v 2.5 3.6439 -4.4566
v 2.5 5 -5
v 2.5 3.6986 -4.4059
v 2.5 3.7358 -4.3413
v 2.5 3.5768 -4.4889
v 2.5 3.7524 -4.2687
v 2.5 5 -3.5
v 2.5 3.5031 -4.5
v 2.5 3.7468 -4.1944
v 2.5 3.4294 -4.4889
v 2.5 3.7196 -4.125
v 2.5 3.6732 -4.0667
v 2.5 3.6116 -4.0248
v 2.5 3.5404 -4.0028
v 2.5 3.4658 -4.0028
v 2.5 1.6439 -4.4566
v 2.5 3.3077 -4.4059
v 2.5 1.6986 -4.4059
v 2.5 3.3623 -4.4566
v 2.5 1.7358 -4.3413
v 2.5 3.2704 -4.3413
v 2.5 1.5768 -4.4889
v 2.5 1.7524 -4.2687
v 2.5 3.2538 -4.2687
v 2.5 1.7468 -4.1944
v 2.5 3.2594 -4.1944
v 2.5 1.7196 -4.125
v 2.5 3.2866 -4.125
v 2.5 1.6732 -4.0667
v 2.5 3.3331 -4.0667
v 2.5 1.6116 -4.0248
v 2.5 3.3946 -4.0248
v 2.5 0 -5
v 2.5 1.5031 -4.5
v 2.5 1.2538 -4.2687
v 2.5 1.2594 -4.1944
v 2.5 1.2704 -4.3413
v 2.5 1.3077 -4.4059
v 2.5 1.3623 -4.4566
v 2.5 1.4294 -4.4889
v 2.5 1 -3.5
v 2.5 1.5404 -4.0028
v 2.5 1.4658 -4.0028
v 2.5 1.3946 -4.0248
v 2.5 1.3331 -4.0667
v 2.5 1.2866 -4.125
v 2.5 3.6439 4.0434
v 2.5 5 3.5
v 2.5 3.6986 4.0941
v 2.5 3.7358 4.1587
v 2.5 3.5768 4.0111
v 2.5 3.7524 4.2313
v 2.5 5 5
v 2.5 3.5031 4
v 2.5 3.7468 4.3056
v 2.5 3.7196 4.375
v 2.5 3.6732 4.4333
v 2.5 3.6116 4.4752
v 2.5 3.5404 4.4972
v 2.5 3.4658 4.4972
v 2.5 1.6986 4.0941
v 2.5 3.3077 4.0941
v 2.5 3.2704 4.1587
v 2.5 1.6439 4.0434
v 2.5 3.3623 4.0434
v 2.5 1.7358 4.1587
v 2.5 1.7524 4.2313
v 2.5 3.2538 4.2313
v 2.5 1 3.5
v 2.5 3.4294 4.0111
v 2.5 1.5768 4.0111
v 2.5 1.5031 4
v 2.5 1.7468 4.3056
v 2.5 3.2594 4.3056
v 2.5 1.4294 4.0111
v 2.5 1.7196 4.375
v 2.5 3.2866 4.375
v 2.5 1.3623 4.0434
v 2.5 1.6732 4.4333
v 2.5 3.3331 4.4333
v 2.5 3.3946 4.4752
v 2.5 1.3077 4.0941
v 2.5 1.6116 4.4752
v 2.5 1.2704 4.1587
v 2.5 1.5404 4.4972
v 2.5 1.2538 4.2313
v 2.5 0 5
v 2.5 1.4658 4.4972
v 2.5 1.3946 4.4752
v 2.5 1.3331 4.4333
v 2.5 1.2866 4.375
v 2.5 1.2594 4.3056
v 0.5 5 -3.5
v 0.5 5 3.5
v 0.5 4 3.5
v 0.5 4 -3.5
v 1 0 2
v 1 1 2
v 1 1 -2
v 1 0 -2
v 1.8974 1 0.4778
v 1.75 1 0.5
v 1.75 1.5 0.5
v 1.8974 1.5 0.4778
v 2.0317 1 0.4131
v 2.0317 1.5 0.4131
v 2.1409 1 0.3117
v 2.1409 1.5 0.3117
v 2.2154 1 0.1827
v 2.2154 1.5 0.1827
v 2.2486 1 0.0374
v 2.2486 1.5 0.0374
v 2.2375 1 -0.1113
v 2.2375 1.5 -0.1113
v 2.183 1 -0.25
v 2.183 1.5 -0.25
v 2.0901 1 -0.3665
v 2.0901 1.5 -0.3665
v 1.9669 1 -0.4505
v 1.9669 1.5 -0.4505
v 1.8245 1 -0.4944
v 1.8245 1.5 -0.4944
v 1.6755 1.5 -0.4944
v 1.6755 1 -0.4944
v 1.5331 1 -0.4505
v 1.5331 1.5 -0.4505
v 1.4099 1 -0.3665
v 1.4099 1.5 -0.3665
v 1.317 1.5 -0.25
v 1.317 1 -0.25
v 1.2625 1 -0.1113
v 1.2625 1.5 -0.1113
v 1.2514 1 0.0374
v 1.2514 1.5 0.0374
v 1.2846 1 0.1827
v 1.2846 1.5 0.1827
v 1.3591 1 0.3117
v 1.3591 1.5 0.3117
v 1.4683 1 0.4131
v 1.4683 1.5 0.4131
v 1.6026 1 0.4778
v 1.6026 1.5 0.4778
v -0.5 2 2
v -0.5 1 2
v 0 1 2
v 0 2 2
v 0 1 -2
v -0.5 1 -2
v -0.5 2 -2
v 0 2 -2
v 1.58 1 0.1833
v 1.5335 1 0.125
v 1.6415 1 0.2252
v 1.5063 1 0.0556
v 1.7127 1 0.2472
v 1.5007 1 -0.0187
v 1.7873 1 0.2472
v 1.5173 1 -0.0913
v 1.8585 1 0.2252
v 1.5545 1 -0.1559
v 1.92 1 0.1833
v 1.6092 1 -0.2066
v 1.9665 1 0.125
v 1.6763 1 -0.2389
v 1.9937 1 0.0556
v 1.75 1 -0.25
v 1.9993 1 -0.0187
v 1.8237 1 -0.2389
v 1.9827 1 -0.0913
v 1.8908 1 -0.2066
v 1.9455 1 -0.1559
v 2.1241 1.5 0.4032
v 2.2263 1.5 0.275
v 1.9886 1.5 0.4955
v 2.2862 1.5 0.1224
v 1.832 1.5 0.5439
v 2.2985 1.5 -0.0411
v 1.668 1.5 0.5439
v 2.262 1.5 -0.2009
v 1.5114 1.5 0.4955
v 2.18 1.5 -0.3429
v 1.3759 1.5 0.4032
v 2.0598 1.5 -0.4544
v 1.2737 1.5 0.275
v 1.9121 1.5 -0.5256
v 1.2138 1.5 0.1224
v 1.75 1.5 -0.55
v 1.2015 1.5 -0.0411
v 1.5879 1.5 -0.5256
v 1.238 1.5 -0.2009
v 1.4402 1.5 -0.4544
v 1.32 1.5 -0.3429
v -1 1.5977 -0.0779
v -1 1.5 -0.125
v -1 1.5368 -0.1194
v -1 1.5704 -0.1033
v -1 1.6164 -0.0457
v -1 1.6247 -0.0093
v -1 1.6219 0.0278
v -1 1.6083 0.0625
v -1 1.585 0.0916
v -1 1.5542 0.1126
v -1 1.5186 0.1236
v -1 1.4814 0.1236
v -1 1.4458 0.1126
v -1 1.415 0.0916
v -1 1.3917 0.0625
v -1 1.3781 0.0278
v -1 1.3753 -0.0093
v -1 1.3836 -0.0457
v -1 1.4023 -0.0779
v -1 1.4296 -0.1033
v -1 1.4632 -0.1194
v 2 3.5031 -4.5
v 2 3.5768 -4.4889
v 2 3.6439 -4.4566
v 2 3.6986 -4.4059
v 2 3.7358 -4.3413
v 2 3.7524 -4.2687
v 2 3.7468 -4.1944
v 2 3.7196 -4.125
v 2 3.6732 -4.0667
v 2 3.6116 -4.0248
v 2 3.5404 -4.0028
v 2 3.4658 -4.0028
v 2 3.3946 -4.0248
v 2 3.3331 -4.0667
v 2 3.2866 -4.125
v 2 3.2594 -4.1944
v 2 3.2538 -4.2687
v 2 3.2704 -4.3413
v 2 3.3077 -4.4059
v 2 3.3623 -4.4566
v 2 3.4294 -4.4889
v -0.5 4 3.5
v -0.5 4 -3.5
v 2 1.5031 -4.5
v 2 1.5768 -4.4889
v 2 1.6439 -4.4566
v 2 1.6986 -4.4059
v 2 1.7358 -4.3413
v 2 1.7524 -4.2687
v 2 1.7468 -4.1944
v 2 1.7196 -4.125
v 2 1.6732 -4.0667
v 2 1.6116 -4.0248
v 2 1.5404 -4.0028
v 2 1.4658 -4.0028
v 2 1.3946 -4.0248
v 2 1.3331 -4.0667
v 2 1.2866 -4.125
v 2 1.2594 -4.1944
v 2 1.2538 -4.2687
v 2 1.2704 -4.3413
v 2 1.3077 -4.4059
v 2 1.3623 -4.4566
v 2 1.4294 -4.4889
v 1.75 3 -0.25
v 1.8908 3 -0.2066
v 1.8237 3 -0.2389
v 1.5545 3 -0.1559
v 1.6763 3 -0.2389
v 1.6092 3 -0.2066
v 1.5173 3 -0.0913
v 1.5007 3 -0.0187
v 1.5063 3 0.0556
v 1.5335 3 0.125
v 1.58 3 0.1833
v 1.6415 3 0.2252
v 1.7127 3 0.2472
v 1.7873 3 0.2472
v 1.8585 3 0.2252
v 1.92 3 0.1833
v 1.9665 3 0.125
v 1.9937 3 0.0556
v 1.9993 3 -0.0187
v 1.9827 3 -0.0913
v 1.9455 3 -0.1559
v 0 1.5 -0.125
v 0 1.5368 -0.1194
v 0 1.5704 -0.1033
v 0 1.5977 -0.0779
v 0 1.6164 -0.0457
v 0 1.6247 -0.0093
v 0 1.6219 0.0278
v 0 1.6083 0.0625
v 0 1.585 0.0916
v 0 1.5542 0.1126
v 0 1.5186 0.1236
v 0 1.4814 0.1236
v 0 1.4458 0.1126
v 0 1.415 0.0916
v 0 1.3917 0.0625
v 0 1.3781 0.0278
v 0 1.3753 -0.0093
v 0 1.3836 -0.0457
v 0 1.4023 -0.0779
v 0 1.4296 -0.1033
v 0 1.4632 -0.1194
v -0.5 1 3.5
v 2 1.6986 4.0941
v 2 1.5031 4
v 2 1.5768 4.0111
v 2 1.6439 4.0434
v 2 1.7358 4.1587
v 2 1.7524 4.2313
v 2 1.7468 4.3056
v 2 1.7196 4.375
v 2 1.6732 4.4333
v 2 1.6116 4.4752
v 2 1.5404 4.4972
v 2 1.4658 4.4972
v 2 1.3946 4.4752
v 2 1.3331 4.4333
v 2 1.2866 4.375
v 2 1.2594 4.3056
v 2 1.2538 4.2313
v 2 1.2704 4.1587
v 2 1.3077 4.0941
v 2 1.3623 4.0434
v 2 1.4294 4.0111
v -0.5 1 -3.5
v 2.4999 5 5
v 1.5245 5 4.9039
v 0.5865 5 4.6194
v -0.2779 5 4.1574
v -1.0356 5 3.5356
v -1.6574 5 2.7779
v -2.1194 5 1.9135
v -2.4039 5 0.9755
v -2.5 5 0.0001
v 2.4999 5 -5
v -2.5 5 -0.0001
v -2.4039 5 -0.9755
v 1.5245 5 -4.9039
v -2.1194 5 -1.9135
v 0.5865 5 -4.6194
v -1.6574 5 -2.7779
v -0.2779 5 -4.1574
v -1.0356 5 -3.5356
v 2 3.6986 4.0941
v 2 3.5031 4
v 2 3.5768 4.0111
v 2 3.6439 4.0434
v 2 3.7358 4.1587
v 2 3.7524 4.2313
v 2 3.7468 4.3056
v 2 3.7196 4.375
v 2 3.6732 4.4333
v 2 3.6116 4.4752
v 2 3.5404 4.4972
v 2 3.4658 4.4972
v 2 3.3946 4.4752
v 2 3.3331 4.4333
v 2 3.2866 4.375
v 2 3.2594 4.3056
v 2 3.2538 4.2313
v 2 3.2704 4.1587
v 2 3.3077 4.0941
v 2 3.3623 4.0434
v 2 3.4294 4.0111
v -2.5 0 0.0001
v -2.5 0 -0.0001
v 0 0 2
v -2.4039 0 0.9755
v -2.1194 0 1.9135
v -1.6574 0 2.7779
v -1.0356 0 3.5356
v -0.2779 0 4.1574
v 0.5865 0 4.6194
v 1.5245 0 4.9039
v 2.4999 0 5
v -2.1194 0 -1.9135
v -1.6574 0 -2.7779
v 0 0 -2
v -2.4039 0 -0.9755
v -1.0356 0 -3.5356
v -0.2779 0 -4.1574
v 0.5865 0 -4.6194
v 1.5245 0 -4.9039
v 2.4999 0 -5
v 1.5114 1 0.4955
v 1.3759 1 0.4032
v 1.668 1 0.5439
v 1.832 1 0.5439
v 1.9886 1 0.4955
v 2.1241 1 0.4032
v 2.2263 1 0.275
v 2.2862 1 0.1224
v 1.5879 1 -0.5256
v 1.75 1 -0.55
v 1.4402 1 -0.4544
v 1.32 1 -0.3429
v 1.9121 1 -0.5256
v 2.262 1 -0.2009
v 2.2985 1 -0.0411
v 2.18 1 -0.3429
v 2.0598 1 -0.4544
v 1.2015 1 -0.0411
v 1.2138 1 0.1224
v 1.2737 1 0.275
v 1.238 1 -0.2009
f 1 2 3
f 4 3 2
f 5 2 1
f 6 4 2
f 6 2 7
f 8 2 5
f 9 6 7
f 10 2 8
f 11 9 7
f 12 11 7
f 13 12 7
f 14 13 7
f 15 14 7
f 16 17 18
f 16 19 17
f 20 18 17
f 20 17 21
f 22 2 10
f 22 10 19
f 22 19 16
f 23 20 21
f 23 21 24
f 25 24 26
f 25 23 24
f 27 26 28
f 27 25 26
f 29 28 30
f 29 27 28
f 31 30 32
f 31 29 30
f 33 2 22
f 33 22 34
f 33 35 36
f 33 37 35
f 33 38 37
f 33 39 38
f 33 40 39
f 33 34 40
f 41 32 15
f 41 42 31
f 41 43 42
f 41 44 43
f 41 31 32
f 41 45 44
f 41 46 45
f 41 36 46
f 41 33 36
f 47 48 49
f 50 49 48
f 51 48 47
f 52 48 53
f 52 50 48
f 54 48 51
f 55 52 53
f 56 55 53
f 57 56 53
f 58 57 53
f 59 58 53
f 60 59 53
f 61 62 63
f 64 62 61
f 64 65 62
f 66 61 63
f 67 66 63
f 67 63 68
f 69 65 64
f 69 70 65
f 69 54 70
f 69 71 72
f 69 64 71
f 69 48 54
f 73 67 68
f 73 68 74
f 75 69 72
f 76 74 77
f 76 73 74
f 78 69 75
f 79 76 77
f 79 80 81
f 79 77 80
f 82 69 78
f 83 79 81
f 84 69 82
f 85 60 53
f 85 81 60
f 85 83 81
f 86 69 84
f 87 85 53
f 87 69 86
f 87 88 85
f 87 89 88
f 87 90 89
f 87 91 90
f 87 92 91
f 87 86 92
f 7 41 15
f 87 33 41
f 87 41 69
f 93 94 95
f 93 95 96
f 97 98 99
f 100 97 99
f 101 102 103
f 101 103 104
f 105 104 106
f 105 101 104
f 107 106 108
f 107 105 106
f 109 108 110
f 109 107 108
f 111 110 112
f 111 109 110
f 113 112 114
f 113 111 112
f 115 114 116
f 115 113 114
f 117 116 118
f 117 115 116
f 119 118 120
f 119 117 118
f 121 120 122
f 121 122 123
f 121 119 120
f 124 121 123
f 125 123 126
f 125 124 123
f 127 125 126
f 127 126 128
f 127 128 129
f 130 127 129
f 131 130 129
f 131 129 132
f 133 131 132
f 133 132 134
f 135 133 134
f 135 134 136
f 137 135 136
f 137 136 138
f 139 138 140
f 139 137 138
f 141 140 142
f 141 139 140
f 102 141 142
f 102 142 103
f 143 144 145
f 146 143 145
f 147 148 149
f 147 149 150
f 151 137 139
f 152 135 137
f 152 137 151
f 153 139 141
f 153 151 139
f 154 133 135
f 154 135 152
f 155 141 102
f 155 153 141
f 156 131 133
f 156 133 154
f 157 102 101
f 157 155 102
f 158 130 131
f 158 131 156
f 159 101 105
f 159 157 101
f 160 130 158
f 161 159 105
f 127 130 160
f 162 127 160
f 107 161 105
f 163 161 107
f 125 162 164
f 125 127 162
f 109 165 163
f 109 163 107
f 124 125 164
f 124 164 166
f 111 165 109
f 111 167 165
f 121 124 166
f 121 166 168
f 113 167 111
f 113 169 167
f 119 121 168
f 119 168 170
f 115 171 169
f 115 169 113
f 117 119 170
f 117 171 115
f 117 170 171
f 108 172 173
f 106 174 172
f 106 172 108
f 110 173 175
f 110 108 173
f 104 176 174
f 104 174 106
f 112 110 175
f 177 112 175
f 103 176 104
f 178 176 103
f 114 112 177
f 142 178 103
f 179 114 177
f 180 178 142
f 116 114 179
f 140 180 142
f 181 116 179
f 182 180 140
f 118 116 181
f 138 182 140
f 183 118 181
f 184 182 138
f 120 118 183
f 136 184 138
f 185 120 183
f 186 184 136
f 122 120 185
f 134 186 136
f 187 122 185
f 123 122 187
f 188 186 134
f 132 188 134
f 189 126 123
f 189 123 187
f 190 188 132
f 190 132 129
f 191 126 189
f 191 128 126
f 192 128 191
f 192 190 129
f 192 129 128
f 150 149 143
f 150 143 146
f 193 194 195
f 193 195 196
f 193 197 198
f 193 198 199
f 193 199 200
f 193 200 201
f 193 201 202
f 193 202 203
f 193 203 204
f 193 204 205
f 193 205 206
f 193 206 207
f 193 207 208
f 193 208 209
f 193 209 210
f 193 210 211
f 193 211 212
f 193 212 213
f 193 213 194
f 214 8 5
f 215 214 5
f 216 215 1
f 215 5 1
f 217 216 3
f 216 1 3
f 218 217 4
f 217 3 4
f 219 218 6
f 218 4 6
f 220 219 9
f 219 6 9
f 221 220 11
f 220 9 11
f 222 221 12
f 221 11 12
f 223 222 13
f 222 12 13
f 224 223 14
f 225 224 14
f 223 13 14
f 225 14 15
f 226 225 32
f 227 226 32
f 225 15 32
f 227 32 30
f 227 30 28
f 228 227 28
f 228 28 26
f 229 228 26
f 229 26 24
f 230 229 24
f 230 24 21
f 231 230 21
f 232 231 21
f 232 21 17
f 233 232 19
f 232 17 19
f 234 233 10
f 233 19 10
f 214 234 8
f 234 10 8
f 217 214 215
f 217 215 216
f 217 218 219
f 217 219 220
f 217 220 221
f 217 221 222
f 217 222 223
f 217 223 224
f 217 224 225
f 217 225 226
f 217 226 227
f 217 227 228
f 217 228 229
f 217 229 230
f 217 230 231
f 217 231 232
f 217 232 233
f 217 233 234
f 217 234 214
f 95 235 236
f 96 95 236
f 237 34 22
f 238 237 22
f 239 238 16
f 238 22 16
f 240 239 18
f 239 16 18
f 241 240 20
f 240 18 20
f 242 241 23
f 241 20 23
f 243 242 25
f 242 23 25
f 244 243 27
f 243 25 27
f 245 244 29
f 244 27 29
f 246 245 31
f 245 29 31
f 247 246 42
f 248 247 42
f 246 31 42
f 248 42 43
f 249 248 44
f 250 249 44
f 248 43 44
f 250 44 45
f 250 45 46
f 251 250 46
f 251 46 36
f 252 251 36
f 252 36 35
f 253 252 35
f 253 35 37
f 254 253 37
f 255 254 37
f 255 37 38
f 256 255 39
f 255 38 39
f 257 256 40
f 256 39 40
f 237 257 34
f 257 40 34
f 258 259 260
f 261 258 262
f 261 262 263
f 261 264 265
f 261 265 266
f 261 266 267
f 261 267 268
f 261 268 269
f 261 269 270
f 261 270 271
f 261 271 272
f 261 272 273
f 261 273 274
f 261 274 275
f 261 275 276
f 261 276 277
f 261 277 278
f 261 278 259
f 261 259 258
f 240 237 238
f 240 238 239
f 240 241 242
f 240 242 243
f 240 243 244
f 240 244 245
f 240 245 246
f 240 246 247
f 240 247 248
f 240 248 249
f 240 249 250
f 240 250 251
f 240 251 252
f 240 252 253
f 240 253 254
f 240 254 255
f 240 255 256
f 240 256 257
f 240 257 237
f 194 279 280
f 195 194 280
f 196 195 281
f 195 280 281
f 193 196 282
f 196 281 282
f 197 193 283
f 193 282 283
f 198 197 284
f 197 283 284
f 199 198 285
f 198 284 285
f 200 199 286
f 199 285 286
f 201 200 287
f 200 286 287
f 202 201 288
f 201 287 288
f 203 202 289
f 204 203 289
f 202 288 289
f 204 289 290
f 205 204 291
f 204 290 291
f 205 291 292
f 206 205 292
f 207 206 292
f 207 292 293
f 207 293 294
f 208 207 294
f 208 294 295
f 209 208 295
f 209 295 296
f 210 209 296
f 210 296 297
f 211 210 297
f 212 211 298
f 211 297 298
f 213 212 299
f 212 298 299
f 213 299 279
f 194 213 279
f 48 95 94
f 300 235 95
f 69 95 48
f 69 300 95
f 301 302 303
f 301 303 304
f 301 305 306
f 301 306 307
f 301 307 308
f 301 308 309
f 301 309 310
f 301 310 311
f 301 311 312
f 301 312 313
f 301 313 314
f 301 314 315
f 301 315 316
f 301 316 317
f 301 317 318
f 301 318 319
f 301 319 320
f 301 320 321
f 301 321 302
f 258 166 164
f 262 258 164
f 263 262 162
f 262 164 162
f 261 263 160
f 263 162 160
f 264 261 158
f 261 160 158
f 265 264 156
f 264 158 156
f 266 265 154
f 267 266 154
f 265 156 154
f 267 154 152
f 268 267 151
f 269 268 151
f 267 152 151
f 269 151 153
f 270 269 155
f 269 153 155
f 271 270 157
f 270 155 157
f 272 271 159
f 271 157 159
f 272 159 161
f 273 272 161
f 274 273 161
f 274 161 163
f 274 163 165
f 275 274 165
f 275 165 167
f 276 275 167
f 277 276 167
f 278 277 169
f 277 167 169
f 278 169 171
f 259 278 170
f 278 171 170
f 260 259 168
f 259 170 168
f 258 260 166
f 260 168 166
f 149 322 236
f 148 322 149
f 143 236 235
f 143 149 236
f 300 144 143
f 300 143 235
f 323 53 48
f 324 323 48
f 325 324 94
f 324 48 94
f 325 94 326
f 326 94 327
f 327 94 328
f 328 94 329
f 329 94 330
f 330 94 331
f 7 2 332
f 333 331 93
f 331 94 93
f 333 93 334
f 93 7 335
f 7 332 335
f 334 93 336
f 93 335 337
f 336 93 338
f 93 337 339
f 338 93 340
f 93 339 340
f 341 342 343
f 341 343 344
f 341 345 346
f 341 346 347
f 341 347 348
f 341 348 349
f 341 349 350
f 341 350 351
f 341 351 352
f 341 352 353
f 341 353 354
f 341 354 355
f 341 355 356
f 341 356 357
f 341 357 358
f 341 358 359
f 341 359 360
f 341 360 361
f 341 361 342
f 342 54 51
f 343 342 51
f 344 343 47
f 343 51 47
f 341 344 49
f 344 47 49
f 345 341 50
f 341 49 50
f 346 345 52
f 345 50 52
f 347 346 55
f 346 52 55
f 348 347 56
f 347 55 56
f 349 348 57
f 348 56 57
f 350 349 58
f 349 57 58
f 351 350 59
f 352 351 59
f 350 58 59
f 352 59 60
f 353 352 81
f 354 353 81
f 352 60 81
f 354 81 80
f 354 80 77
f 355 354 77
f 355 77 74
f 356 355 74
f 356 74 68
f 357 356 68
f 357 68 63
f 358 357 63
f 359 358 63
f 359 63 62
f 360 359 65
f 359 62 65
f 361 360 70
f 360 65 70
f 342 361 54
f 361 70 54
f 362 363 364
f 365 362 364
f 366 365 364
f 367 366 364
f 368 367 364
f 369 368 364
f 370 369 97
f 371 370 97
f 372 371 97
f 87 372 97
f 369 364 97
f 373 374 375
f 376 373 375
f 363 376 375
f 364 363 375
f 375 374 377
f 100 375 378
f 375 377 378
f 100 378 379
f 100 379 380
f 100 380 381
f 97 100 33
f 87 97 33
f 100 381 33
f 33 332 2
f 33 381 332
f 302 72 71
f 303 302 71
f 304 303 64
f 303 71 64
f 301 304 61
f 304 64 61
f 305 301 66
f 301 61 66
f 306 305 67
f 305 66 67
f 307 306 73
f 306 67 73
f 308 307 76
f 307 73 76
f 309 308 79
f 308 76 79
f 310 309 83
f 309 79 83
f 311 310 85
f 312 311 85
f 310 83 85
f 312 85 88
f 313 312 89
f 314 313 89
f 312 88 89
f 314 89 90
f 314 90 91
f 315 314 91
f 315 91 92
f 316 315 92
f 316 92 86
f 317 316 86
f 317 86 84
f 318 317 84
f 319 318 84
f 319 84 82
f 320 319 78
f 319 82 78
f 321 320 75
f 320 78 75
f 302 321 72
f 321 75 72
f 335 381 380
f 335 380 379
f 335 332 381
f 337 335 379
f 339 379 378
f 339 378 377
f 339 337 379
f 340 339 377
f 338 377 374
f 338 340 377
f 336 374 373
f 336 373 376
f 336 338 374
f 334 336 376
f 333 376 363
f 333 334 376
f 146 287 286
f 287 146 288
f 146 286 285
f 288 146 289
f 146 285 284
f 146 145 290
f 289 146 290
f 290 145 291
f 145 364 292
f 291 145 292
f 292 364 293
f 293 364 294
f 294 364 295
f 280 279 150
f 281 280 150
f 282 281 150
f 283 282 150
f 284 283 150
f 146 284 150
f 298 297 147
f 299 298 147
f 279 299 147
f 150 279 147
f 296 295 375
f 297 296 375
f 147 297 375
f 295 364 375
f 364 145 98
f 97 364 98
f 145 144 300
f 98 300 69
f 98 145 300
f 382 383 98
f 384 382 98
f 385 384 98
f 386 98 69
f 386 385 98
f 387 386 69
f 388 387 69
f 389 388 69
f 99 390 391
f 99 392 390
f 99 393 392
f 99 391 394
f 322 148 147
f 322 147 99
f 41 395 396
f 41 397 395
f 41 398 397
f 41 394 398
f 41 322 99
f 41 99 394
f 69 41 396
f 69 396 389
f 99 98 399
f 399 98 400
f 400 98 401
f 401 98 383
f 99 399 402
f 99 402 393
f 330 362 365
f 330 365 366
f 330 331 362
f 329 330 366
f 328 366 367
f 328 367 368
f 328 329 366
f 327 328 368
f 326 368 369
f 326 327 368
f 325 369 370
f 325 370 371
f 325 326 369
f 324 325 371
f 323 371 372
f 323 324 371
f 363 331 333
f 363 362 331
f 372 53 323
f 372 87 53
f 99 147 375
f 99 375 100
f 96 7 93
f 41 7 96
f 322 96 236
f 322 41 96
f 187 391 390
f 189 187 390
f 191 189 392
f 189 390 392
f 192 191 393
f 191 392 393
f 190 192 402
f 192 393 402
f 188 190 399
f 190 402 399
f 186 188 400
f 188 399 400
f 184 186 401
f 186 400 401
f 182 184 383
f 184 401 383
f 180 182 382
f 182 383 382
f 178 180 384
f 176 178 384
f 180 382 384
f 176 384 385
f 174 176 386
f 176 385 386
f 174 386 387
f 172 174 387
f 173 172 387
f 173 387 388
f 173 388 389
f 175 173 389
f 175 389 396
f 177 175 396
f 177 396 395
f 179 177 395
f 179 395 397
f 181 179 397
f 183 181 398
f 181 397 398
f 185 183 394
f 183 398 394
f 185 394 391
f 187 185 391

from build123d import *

# Parameters (mm, degrees)
SZKIC1_W                    = 5
SZKIC1_H                    = 10
DODANIE_WYCI_GNI_CIE1_DEPTH = 1
DODANIE_WYCI_GNI_CIE4_DEPTH = 4
ZAOKR_GLENIE2_R             = 5
SZKIC3_W                    = 1
SZKIC3_H                    = 4
WYTNIJ_WYCI_GNI_CIE1_DEPTH  = 4
SZKIC4_W                    = 0.5
SZKIC4_H                    = 4
DODANIE_WYCI_GNI_CIE5_DEPTH = 1
SZKIC5_R                    = 0.25
DODANIE_WYCI_GNI_CIE6_DEPTH = 2
SZKIC6_R                    = 0.55
SZKIC6_R_2                  = 0.5
DODANIE_WYCI_GNI_CIE7_DEPTH = 0.5
SZKIC7_W                    = 7
SZKIC7_H                    = 1
DODANIE_WYCI_GNI_CIE8_DEPTH = 1
SZKIC11_R                   = 0.25
WYTNIJ_WYCI_GNI_CIE2_DEPTH  = 0.5
SZKIC14_R                   = 0.125
WYTNIJ_WYCI_GNI_CIE3_DEPTH  = 1


with BuildPart() as part:
    # Szkic1 → Dodanie-wyciągnięcie1 (new body)
    with BuildSketch(Plane(origin=(0, 0, 0), x_dir=(1, 0, 0), z_dir=(0, 1, 0))):
        Rectangle(SZKIC1_W, SZKIC1_H)
    extrude(amount=DODANIE_WYCI_GNI_CIE1_DEPTH)

    # Szkic2 → Dodanie-wyciągnięcie4 (add)
    with BuildSketch(Plane(origin=(0, 1, 0), x_dir=(1, 0, 0), z_dir=(0, 1, 0))):
        Polygon((-2.5, 5), (2.5, 5), (2.5, 3.5), (-0.5, 3.5), (-0.5, -3.5), (2.5, -3.5), (2.5, -5), (-2.5, -5), align=None)
    extrude(amount=DODANIE_WYCI_GNI_CIE4_DEPTH)

    # Zaokrąglenie2
    zaokr_glenie2_edges = [part.edges().sort_by_distance(p)[0] for p in [
        (-2.5, 2.5, -5),
        (-2.5, 2.5, 5),
    ]]
    fillet(zaokr_glenie2_edges, radius=ZAOKR_GLENIE2_R - 0.0001)  # a hair under: the kernel refuses the full size

    # Szkic3 → Wytnij-wyciągnięcie1 (cut)
    with BuildSketch(Plane(origin=(0, 1, 0), x_dir=(1, 0, 0), z_dir=(0, 1, 0))):
        with Locations((0.5, 0)):
            Rectangle(SZKIC3_W, SZKIC3_H)
    extrude(amount=-WYTNIJ_WYCI_GNI_CIE1_DEPTH, mode=Mode.SUBTRACT)

    # Szkic4 → Dodanie-wyciągnięcie5 (add)
    with BuildSketch(Plane(origin=(0, 1, 0), x_dir=(1, 0, 0), z_dir=(0, 1, 0))):
        with Locations((-0.25, 0)):
            Rectangle(SZKIC4_W, SZKIC4_H)
    extrude(amount=DODANIE_WYCI_GNI_CIE5_DEPTH)

    # Szkic5 → Dodanie-wyciągnięcie6 (add)
    with BuildSketch(Plane(origin=(0, 1, 0), x_dir=(1, 0, 0), z_dir=(0, 1, 0))):
        with Locations(Location((1.75, 0, 0), (0, 0, 90))):
            Circle(SZKIC5_R)
    extrude(amount=DODANIE_WYCI_GNI_CIE6_DEPTH)

    # Szkic6 → Dodanie-wyciągnięcie7 (add)
    with BuildSketch(Plane(origin=(0, 1, 0), x_dir=(1, 0, 0), z_dir=(0, 1, 0))):
        with Locations(Location((1.75, 0, 0), (0, 0, 90))):
            Circle(SZKIC6_R)
        with Locations(Location((1.75, 0, 0), (0, 0, 270))):
            Circle(SZKIC6_R_2, mode=Mode.SUBTRACT)
    extrude(amount=DODANIE_WYCI_GNI_CIE7_DEPTH)

    # Szkic7 → Dodanie-wyciągnięcie8 (add)
    with BuildSketch(Plane(origin=(-0.5, 0, 0), x_dir=(0, 0, -1), z_dir=(1, 0, 0))):
        with Locations((0, 4.5)):
            Rectangle(SZKIC7_W, SZKIC7_H)
    extrude(amount=DODANIE_WYCI_GNI_CIE8_DEPTH)

    # Szkic11 → Wytnij-wyciągnięcie2 (cut)
    with BuildSketch(Plane(origin=(2.5, 0, 0), x_dir=(0, 0, -1), z_dir=(1, 0, 0))):
        with Locations((4.25, 3.503110499)):
            Circle(SZKIC11_R)
        with Locations((4.25, 1.503110499)):
            Circle(SZKIC11_R)
        with Locations((-4.25, 3.503110499)):
            Circle(SZKIC11_R)
        with Locations((-4.25, 1.503110499)):
            Circle(SZKIC11_R)
    extrude(amount=-WYTNIJ_WYCI_GNI_CIE2_DEPTH, mode=Mode.SUBTRACT)

    # Szkic14 → Wytnij-wyciągnięcie3 (cut)
    with BuildSketch(Plane(origin=(0, 0, 0), x_dir=(0, 0, -1), z_dir=(1, 0, 0))):
        with Locations((0, 1.5)):
            Circle(SZKIC14_R)
    extrude(amount=-WYTNIJ_WYCI_GNI_CIE3_DEPTH, mode=Mode.SUBTRACT)


solid = part.part
